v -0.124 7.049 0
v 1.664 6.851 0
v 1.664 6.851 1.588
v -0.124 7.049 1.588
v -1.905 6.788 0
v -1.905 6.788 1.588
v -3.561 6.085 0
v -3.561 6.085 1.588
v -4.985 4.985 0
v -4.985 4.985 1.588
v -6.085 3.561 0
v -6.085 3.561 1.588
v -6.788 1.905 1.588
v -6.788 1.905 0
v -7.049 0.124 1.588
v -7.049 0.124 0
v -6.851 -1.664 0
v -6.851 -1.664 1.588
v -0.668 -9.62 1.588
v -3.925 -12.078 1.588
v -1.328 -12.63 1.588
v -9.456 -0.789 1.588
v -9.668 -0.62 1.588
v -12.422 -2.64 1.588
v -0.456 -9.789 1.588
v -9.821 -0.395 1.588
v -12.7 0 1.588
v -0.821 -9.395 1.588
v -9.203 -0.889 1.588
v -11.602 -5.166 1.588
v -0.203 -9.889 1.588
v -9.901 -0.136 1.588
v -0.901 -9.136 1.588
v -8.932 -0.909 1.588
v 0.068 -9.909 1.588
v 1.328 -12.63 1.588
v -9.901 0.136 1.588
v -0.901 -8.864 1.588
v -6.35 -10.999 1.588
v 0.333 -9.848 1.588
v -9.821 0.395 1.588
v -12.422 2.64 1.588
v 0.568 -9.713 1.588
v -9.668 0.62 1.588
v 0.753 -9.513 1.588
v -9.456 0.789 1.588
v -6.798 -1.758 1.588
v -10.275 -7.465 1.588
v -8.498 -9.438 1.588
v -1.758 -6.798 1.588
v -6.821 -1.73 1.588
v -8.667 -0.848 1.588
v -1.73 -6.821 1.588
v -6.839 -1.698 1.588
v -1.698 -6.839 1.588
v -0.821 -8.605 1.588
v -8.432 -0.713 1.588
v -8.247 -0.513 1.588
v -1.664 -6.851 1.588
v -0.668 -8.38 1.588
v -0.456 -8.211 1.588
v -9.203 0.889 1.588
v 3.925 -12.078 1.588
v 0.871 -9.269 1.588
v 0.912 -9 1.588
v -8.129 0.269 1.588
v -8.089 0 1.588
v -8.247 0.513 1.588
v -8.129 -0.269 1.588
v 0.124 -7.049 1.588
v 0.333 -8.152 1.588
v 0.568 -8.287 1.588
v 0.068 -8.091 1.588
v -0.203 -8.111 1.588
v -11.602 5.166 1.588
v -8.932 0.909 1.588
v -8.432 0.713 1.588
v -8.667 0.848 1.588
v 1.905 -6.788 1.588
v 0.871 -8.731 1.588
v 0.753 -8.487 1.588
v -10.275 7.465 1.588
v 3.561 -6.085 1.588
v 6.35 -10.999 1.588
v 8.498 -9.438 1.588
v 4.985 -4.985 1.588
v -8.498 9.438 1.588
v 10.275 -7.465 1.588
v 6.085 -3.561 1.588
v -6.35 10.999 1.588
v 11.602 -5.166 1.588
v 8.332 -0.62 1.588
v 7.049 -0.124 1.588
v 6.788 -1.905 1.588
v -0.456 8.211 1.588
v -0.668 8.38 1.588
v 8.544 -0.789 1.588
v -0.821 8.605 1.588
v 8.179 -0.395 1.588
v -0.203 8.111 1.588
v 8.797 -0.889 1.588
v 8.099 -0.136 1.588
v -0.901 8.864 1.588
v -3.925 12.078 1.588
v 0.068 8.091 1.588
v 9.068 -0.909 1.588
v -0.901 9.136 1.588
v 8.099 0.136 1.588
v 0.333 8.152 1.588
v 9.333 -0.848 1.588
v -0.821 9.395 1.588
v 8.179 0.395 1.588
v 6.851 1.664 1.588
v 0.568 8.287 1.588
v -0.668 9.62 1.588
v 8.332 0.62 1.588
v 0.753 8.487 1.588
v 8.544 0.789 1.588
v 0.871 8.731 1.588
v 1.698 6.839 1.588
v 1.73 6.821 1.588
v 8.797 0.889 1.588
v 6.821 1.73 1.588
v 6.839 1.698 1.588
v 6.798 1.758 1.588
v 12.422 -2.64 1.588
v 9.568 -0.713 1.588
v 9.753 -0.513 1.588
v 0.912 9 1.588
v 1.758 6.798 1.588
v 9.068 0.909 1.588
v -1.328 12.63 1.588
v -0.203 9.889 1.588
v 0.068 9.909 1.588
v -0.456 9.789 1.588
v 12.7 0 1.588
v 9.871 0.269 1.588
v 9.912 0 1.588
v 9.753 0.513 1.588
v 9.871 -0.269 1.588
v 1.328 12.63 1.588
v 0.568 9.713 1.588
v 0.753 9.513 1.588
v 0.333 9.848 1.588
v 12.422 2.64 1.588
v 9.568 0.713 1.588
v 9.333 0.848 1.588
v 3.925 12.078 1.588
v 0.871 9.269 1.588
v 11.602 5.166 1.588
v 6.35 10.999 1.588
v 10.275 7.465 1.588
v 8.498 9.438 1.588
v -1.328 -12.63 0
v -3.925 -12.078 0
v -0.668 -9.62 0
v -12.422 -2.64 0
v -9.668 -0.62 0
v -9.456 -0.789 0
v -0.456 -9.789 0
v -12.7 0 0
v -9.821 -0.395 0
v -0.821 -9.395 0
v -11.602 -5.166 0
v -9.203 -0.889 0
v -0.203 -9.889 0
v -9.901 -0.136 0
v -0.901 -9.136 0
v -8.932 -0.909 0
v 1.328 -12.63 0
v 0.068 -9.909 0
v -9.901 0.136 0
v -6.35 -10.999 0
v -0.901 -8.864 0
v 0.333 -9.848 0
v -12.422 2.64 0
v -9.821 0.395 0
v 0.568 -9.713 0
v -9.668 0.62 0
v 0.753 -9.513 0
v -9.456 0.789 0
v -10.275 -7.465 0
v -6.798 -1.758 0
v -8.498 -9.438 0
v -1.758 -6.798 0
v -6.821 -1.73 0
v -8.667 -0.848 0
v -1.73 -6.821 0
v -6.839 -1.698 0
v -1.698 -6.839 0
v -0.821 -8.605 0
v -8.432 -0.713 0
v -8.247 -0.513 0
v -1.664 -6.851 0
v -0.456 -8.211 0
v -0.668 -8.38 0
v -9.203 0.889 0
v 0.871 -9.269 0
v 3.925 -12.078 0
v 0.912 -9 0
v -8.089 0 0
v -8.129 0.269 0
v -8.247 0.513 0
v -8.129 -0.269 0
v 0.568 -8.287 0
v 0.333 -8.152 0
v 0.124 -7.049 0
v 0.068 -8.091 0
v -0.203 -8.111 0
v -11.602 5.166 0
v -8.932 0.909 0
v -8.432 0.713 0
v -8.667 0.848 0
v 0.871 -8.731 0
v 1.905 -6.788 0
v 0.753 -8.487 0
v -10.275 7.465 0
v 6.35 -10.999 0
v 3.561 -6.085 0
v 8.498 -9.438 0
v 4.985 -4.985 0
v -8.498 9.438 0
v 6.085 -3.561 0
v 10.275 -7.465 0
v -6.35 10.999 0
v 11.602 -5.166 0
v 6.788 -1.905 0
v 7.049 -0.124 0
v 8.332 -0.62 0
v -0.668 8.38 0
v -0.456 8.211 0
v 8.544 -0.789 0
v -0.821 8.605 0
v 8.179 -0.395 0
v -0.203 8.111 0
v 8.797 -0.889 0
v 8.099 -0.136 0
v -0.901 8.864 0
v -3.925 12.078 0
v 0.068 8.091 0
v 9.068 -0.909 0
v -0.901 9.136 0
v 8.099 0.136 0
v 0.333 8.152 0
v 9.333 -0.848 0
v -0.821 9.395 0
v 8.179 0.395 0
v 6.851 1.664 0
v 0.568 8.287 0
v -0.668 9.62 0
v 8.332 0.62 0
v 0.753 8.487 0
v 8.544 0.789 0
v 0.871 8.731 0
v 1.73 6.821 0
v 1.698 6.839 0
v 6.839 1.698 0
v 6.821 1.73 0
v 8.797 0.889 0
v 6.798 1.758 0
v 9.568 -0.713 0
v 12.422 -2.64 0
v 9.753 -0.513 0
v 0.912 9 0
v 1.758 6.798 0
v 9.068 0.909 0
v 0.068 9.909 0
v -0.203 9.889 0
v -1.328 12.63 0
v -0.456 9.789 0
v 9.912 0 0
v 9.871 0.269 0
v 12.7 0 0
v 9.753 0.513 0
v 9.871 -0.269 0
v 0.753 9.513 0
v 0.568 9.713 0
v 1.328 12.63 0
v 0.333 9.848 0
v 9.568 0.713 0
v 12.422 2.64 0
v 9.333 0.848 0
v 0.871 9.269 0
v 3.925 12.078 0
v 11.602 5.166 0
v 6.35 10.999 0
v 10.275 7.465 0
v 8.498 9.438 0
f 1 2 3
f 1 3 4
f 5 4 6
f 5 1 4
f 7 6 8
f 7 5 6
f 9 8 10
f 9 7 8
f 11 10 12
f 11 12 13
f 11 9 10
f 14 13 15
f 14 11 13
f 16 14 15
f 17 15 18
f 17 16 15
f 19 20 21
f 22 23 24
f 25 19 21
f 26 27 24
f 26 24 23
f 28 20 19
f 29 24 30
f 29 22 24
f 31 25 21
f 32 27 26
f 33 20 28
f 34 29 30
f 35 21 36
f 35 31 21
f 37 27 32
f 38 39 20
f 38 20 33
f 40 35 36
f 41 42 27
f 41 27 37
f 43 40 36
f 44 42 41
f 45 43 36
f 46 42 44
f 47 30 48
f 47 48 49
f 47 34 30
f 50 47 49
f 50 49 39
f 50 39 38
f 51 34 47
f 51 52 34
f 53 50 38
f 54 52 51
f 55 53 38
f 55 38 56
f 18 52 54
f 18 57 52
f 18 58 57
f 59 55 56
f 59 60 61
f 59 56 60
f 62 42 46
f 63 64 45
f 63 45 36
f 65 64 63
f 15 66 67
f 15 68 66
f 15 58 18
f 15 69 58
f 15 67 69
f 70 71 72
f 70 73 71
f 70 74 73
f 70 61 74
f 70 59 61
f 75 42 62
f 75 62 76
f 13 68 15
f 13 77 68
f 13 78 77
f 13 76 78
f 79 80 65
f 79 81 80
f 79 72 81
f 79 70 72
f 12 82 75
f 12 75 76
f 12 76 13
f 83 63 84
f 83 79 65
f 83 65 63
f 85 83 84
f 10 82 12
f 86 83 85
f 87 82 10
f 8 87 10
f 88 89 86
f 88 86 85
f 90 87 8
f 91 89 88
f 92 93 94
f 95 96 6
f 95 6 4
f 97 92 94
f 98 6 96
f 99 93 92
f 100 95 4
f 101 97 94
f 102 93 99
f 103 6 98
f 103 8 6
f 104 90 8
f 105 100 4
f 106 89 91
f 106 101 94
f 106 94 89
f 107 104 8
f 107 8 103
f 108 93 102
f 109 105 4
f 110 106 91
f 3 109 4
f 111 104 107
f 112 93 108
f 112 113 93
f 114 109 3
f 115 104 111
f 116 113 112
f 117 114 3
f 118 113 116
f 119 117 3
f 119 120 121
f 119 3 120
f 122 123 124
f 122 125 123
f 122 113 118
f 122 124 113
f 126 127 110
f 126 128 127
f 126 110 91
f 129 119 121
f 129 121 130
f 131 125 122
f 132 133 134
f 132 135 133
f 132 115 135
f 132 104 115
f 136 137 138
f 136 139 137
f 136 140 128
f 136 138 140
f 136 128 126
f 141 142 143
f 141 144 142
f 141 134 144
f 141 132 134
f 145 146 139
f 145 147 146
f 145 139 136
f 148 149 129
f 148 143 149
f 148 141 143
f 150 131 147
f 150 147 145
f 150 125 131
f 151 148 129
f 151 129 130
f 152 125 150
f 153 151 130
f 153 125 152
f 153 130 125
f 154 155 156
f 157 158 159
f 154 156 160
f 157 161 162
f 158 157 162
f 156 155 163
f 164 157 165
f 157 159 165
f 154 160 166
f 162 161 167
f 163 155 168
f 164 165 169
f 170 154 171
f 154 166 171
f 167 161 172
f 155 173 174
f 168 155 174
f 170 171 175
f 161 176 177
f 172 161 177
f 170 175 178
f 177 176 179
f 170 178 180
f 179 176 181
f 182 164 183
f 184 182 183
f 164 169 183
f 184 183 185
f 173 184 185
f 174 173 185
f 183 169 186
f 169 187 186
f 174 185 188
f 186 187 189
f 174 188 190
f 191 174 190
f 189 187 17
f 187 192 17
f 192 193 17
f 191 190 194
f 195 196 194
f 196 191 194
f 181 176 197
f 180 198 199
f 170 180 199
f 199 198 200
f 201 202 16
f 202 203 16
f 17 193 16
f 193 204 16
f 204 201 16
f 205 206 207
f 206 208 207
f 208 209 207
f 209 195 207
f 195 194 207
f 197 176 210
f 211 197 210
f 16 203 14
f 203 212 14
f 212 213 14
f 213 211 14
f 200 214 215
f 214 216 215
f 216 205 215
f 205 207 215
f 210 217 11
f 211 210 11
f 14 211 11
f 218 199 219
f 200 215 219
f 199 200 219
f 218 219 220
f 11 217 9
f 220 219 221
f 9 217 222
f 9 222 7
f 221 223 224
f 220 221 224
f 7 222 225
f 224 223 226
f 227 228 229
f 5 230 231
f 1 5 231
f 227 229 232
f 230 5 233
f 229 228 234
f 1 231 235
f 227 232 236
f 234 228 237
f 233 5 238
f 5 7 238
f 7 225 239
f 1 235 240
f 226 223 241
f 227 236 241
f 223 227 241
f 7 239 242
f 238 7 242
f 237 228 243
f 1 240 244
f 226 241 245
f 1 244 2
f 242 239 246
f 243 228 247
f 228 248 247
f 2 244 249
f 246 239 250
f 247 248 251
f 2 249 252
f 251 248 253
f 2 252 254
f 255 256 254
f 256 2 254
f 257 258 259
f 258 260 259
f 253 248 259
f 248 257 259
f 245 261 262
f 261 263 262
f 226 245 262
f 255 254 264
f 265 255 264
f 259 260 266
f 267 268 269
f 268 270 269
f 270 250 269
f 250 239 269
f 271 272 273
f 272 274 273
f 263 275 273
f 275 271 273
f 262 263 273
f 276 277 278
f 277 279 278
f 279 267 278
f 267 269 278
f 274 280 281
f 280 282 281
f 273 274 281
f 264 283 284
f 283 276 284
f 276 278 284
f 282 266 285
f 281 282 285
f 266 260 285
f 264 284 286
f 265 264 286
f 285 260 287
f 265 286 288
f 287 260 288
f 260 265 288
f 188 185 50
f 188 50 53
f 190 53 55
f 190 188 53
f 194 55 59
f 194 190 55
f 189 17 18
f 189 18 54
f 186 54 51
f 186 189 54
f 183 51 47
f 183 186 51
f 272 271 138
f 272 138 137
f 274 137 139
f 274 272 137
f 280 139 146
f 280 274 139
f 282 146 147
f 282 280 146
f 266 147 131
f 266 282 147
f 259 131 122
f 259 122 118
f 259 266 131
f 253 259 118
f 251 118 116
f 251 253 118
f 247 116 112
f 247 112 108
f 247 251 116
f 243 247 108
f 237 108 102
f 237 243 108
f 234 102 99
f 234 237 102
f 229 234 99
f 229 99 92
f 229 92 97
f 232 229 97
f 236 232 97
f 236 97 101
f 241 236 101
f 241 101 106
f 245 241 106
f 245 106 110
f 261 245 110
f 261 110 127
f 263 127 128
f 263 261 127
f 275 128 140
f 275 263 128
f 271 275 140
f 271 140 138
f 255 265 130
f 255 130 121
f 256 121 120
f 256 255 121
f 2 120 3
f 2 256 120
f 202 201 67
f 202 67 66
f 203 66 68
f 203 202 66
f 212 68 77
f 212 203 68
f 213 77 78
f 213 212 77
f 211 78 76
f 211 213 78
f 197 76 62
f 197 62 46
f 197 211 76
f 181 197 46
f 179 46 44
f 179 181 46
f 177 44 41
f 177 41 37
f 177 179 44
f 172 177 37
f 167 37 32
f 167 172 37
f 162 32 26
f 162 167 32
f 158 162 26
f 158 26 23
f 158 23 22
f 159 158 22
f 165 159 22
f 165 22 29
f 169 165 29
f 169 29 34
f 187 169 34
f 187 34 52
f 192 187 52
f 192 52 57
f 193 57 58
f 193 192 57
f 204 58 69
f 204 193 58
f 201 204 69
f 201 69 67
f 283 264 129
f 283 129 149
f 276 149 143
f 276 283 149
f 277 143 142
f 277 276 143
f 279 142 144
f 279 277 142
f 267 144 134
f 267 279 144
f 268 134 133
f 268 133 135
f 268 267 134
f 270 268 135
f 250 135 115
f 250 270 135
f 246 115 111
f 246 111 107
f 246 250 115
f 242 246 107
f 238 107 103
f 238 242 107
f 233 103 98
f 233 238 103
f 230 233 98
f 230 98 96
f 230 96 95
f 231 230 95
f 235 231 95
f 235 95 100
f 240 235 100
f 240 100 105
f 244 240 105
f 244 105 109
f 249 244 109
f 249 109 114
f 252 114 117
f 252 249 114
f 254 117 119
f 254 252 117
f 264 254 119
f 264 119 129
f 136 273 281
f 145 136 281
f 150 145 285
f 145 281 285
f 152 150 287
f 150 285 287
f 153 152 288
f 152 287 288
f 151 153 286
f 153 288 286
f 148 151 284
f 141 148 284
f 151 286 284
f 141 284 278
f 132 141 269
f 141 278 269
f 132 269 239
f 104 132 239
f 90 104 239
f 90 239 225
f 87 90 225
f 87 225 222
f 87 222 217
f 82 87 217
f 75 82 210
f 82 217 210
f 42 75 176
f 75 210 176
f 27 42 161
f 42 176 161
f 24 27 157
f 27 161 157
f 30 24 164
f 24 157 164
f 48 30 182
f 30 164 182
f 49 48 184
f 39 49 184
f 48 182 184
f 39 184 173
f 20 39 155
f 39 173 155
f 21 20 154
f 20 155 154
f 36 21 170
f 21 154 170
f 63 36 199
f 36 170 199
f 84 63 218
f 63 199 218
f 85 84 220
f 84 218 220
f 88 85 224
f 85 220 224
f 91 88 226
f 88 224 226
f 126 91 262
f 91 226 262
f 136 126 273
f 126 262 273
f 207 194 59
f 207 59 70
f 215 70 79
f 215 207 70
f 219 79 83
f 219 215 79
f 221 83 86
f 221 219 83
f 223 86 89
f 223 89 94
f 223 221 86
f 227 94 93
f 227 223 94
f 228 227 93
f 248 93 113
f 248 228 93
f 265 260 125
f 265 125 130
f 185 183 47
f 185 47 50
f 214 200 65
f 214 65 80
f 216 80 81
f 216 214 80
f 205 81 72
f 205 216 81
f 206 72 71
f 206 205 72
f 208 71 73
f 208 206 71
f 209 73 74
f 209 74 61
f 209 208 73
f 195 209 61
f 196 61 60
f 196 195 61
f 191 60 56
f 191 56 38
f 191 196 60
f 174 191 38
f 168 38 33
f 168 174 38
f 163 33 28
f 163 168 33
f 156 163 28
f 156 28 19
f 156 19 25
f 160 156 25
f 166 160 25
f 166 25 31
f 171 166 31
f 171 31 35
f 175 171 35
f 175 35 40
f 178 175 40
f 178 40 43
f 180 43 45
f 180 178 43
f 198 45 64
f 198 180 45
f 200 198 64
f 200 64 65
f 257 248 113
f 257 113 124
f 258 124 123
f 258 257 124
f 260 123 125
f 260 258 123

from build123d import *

# Parameters (mm, degrees)
SKETCH6_R           = 12.7
SKETCH6_R_2         = 0.9115
BOSS_EXTRUDE3_DEPTH = 1.5875


with BuildPart() as part:
    # Sketch6 → Boss-Extrude3 (new body)
    # profile 1 of 2: a face of its own
    with BuildSketch(Plane.XY):
        Circle(SKETCH6_R)
        with BuildLine():
            ThreePointArc((6.269554118, 8.885849209), (0, 10.875), (-6.269554118, 8.885849209))
            Line((-6.269554118, 8.885849209), (-5.055813485, 7.672108576))
            ThreePointArc((-5.055813485, 7.672108576), (-5.055813485, 5.055813485), (-7.672108576, 5.055813485))
            Line((-7.672108576, 5.055813485), (-8.885849209, 6.269554118))
            ThreePointArc((-8.885849209, 6.269554118), (-10.875, 0), (-8.885849209, -6.269554118))
            Line((-8.885849209, -6.269554118), (-7.672108576, -5.055813485))
            ThreePointArc((-7.672108576, -5.055813485), (-5.055813485, -5.055813485), (-5.055813485, -7.672108576))
            Line((-5.055813485, -7.672108576), (-6.269554118, -8.885849209))
            ThreePointArc((-6.269554118, -8.885849209), (0, -10.875), (6.269554118, -8.885849209))
            Line((6.269554118, -8.885849209), (5.055813485, -7.672108576))
            ThreePointArc((5.055813485, -7.672108576), (5.055813485, -5.055813485), (7.672108576, -5.055813485))
            Line((7.672108576, -5.055813485), (8.885849209, -6.269554118))
            ThreePointArc((8.885849209, -6.269554118), (10.875, 0), (8.885849209, 6.269554118))
            Line((8.885849209, 6.269554118), (7.672108576, 5.055813485))
            ThreePointArc((7.672108576, 5.055813485), (5.055813485, 5.055813485), (5.055813485, 7.672108576))
            Line((5.055813485, 7.672108576), (6.269554118, 8.885849209))
        make_face(mode=Mode.SUBTRACT)
    # profile 2 of 2: a face of its own
    with BuildSketch(Plane.XY):
        with BuildLine():
            Line((5.055813485, 7.672108576), (6.269554118, 8.885849209))
            ThreePointArc((6.269554118, 8.885849209), (0, 10.875), (-6.269554118, 8.885849209))
            Line((-6.269554118, 8.885849209), (-5.055813485, 7.672108576))
            ThreePointArc((-5.055813485, 7.672108576), (-5.055813485, 5.055813485), (-7.672108576, 5.055813485))
            Line((-7.672108576, 5.055813485), (-8.885849209, 6.269554118))
            ThreePointArc((-8.885849209, 6.269554118), (-10.875, 0), (-8.885849209, -6.269554118))
            Line((-8.885849209, -6.269554118), (-7.672108576, -5.055813485))
            ThreePointArc((-7.672108576, -5.055813485), (-5.055813485, -5.055813485), (-5.055813485, -7.672108576))
            Line((-5.055813485, -7.672108576), (-6.269554118, -8.885849209))
            ThreePointArc((-6.269554118, -8.885849209), (0, -10.875), (6.269554118, -8.885849209))
            Line((6.269554118, -8.885849209), (5.055813485, -7.672108576))
            ThreePointArc((5.055813485, -7.672108576), (5.055813485, -5.055813485), (7.672108576, -5.055813485))
            Line((7.672108576, -5.055813485), (8.885849209, -6.269554118))
            ThreePointArc((8.885849209, -6.269554118), (10.875, 0), (8.885849209, 6.269554118))
            Line((8.885849209, 6.269554118), (7.672108576, 5.055813485))
            ThreePointArc((7.672108576, 5.055813485), (5.055813485, 5.055813485), (5.055813485, 7.672108576))
        make_face()
        with Locations((0, 9.000000134)):
            Circle(SKETCH6_R_2, mode=Mode.SUBTRACT)
        with Locations((9.000000134, 0)):
            Circle(SKETCH6_R_2, mode=Mode.SUBTRACT)
        with Locations((0, -9.000000134)):
            Circle(SKETCH6_R_2, mode=Mode.SUBTRACT)
        with Locations((-9.000000134, 0)):
            Circle(SKETCH6_R_2, mode=Mode.SUBTRACT)
        with BuildLine():
            ThreePointArc((-1.663855614, -6.850845531), (4.985102807, -4.985102807), (6.850845531, 1.663855614))
            ThreePointArc((6.850845531, 1.663855614), (6.830865544, 1.714608205), (6.79791666, 1.758075393))
            Line((6.79791666, 1.758075393), (1.758075393, 6.79791666))
            ThreePointArc((1.758075393, 6.79791666), (1.714608205, 6.830865544), (1.663855614, 6.850845531))
            ThreePointArc((1.663855614, 6.850845531), (-4.985102807, 4.985102807), (-6.850845531, -1.663855614))
            ThreePointArc((-6.850845531, -1.663855614), (-6.830865544, -1.714608205), (-6.79791666, -1.758075393))
            Line((-6.79791666, -1.758075393), (-1.758075393, -6.79791666))
            ThreePointArc((-1.758075393, -6.79791666), (-1.714608205, -6.830865544), (-1.663855614, -6.850845531))
        make_face(mode=Mode.SUBTRACT)
    extrude(amount=BOSS_EXTRUDE3_DEPTH)


solid = part.part
